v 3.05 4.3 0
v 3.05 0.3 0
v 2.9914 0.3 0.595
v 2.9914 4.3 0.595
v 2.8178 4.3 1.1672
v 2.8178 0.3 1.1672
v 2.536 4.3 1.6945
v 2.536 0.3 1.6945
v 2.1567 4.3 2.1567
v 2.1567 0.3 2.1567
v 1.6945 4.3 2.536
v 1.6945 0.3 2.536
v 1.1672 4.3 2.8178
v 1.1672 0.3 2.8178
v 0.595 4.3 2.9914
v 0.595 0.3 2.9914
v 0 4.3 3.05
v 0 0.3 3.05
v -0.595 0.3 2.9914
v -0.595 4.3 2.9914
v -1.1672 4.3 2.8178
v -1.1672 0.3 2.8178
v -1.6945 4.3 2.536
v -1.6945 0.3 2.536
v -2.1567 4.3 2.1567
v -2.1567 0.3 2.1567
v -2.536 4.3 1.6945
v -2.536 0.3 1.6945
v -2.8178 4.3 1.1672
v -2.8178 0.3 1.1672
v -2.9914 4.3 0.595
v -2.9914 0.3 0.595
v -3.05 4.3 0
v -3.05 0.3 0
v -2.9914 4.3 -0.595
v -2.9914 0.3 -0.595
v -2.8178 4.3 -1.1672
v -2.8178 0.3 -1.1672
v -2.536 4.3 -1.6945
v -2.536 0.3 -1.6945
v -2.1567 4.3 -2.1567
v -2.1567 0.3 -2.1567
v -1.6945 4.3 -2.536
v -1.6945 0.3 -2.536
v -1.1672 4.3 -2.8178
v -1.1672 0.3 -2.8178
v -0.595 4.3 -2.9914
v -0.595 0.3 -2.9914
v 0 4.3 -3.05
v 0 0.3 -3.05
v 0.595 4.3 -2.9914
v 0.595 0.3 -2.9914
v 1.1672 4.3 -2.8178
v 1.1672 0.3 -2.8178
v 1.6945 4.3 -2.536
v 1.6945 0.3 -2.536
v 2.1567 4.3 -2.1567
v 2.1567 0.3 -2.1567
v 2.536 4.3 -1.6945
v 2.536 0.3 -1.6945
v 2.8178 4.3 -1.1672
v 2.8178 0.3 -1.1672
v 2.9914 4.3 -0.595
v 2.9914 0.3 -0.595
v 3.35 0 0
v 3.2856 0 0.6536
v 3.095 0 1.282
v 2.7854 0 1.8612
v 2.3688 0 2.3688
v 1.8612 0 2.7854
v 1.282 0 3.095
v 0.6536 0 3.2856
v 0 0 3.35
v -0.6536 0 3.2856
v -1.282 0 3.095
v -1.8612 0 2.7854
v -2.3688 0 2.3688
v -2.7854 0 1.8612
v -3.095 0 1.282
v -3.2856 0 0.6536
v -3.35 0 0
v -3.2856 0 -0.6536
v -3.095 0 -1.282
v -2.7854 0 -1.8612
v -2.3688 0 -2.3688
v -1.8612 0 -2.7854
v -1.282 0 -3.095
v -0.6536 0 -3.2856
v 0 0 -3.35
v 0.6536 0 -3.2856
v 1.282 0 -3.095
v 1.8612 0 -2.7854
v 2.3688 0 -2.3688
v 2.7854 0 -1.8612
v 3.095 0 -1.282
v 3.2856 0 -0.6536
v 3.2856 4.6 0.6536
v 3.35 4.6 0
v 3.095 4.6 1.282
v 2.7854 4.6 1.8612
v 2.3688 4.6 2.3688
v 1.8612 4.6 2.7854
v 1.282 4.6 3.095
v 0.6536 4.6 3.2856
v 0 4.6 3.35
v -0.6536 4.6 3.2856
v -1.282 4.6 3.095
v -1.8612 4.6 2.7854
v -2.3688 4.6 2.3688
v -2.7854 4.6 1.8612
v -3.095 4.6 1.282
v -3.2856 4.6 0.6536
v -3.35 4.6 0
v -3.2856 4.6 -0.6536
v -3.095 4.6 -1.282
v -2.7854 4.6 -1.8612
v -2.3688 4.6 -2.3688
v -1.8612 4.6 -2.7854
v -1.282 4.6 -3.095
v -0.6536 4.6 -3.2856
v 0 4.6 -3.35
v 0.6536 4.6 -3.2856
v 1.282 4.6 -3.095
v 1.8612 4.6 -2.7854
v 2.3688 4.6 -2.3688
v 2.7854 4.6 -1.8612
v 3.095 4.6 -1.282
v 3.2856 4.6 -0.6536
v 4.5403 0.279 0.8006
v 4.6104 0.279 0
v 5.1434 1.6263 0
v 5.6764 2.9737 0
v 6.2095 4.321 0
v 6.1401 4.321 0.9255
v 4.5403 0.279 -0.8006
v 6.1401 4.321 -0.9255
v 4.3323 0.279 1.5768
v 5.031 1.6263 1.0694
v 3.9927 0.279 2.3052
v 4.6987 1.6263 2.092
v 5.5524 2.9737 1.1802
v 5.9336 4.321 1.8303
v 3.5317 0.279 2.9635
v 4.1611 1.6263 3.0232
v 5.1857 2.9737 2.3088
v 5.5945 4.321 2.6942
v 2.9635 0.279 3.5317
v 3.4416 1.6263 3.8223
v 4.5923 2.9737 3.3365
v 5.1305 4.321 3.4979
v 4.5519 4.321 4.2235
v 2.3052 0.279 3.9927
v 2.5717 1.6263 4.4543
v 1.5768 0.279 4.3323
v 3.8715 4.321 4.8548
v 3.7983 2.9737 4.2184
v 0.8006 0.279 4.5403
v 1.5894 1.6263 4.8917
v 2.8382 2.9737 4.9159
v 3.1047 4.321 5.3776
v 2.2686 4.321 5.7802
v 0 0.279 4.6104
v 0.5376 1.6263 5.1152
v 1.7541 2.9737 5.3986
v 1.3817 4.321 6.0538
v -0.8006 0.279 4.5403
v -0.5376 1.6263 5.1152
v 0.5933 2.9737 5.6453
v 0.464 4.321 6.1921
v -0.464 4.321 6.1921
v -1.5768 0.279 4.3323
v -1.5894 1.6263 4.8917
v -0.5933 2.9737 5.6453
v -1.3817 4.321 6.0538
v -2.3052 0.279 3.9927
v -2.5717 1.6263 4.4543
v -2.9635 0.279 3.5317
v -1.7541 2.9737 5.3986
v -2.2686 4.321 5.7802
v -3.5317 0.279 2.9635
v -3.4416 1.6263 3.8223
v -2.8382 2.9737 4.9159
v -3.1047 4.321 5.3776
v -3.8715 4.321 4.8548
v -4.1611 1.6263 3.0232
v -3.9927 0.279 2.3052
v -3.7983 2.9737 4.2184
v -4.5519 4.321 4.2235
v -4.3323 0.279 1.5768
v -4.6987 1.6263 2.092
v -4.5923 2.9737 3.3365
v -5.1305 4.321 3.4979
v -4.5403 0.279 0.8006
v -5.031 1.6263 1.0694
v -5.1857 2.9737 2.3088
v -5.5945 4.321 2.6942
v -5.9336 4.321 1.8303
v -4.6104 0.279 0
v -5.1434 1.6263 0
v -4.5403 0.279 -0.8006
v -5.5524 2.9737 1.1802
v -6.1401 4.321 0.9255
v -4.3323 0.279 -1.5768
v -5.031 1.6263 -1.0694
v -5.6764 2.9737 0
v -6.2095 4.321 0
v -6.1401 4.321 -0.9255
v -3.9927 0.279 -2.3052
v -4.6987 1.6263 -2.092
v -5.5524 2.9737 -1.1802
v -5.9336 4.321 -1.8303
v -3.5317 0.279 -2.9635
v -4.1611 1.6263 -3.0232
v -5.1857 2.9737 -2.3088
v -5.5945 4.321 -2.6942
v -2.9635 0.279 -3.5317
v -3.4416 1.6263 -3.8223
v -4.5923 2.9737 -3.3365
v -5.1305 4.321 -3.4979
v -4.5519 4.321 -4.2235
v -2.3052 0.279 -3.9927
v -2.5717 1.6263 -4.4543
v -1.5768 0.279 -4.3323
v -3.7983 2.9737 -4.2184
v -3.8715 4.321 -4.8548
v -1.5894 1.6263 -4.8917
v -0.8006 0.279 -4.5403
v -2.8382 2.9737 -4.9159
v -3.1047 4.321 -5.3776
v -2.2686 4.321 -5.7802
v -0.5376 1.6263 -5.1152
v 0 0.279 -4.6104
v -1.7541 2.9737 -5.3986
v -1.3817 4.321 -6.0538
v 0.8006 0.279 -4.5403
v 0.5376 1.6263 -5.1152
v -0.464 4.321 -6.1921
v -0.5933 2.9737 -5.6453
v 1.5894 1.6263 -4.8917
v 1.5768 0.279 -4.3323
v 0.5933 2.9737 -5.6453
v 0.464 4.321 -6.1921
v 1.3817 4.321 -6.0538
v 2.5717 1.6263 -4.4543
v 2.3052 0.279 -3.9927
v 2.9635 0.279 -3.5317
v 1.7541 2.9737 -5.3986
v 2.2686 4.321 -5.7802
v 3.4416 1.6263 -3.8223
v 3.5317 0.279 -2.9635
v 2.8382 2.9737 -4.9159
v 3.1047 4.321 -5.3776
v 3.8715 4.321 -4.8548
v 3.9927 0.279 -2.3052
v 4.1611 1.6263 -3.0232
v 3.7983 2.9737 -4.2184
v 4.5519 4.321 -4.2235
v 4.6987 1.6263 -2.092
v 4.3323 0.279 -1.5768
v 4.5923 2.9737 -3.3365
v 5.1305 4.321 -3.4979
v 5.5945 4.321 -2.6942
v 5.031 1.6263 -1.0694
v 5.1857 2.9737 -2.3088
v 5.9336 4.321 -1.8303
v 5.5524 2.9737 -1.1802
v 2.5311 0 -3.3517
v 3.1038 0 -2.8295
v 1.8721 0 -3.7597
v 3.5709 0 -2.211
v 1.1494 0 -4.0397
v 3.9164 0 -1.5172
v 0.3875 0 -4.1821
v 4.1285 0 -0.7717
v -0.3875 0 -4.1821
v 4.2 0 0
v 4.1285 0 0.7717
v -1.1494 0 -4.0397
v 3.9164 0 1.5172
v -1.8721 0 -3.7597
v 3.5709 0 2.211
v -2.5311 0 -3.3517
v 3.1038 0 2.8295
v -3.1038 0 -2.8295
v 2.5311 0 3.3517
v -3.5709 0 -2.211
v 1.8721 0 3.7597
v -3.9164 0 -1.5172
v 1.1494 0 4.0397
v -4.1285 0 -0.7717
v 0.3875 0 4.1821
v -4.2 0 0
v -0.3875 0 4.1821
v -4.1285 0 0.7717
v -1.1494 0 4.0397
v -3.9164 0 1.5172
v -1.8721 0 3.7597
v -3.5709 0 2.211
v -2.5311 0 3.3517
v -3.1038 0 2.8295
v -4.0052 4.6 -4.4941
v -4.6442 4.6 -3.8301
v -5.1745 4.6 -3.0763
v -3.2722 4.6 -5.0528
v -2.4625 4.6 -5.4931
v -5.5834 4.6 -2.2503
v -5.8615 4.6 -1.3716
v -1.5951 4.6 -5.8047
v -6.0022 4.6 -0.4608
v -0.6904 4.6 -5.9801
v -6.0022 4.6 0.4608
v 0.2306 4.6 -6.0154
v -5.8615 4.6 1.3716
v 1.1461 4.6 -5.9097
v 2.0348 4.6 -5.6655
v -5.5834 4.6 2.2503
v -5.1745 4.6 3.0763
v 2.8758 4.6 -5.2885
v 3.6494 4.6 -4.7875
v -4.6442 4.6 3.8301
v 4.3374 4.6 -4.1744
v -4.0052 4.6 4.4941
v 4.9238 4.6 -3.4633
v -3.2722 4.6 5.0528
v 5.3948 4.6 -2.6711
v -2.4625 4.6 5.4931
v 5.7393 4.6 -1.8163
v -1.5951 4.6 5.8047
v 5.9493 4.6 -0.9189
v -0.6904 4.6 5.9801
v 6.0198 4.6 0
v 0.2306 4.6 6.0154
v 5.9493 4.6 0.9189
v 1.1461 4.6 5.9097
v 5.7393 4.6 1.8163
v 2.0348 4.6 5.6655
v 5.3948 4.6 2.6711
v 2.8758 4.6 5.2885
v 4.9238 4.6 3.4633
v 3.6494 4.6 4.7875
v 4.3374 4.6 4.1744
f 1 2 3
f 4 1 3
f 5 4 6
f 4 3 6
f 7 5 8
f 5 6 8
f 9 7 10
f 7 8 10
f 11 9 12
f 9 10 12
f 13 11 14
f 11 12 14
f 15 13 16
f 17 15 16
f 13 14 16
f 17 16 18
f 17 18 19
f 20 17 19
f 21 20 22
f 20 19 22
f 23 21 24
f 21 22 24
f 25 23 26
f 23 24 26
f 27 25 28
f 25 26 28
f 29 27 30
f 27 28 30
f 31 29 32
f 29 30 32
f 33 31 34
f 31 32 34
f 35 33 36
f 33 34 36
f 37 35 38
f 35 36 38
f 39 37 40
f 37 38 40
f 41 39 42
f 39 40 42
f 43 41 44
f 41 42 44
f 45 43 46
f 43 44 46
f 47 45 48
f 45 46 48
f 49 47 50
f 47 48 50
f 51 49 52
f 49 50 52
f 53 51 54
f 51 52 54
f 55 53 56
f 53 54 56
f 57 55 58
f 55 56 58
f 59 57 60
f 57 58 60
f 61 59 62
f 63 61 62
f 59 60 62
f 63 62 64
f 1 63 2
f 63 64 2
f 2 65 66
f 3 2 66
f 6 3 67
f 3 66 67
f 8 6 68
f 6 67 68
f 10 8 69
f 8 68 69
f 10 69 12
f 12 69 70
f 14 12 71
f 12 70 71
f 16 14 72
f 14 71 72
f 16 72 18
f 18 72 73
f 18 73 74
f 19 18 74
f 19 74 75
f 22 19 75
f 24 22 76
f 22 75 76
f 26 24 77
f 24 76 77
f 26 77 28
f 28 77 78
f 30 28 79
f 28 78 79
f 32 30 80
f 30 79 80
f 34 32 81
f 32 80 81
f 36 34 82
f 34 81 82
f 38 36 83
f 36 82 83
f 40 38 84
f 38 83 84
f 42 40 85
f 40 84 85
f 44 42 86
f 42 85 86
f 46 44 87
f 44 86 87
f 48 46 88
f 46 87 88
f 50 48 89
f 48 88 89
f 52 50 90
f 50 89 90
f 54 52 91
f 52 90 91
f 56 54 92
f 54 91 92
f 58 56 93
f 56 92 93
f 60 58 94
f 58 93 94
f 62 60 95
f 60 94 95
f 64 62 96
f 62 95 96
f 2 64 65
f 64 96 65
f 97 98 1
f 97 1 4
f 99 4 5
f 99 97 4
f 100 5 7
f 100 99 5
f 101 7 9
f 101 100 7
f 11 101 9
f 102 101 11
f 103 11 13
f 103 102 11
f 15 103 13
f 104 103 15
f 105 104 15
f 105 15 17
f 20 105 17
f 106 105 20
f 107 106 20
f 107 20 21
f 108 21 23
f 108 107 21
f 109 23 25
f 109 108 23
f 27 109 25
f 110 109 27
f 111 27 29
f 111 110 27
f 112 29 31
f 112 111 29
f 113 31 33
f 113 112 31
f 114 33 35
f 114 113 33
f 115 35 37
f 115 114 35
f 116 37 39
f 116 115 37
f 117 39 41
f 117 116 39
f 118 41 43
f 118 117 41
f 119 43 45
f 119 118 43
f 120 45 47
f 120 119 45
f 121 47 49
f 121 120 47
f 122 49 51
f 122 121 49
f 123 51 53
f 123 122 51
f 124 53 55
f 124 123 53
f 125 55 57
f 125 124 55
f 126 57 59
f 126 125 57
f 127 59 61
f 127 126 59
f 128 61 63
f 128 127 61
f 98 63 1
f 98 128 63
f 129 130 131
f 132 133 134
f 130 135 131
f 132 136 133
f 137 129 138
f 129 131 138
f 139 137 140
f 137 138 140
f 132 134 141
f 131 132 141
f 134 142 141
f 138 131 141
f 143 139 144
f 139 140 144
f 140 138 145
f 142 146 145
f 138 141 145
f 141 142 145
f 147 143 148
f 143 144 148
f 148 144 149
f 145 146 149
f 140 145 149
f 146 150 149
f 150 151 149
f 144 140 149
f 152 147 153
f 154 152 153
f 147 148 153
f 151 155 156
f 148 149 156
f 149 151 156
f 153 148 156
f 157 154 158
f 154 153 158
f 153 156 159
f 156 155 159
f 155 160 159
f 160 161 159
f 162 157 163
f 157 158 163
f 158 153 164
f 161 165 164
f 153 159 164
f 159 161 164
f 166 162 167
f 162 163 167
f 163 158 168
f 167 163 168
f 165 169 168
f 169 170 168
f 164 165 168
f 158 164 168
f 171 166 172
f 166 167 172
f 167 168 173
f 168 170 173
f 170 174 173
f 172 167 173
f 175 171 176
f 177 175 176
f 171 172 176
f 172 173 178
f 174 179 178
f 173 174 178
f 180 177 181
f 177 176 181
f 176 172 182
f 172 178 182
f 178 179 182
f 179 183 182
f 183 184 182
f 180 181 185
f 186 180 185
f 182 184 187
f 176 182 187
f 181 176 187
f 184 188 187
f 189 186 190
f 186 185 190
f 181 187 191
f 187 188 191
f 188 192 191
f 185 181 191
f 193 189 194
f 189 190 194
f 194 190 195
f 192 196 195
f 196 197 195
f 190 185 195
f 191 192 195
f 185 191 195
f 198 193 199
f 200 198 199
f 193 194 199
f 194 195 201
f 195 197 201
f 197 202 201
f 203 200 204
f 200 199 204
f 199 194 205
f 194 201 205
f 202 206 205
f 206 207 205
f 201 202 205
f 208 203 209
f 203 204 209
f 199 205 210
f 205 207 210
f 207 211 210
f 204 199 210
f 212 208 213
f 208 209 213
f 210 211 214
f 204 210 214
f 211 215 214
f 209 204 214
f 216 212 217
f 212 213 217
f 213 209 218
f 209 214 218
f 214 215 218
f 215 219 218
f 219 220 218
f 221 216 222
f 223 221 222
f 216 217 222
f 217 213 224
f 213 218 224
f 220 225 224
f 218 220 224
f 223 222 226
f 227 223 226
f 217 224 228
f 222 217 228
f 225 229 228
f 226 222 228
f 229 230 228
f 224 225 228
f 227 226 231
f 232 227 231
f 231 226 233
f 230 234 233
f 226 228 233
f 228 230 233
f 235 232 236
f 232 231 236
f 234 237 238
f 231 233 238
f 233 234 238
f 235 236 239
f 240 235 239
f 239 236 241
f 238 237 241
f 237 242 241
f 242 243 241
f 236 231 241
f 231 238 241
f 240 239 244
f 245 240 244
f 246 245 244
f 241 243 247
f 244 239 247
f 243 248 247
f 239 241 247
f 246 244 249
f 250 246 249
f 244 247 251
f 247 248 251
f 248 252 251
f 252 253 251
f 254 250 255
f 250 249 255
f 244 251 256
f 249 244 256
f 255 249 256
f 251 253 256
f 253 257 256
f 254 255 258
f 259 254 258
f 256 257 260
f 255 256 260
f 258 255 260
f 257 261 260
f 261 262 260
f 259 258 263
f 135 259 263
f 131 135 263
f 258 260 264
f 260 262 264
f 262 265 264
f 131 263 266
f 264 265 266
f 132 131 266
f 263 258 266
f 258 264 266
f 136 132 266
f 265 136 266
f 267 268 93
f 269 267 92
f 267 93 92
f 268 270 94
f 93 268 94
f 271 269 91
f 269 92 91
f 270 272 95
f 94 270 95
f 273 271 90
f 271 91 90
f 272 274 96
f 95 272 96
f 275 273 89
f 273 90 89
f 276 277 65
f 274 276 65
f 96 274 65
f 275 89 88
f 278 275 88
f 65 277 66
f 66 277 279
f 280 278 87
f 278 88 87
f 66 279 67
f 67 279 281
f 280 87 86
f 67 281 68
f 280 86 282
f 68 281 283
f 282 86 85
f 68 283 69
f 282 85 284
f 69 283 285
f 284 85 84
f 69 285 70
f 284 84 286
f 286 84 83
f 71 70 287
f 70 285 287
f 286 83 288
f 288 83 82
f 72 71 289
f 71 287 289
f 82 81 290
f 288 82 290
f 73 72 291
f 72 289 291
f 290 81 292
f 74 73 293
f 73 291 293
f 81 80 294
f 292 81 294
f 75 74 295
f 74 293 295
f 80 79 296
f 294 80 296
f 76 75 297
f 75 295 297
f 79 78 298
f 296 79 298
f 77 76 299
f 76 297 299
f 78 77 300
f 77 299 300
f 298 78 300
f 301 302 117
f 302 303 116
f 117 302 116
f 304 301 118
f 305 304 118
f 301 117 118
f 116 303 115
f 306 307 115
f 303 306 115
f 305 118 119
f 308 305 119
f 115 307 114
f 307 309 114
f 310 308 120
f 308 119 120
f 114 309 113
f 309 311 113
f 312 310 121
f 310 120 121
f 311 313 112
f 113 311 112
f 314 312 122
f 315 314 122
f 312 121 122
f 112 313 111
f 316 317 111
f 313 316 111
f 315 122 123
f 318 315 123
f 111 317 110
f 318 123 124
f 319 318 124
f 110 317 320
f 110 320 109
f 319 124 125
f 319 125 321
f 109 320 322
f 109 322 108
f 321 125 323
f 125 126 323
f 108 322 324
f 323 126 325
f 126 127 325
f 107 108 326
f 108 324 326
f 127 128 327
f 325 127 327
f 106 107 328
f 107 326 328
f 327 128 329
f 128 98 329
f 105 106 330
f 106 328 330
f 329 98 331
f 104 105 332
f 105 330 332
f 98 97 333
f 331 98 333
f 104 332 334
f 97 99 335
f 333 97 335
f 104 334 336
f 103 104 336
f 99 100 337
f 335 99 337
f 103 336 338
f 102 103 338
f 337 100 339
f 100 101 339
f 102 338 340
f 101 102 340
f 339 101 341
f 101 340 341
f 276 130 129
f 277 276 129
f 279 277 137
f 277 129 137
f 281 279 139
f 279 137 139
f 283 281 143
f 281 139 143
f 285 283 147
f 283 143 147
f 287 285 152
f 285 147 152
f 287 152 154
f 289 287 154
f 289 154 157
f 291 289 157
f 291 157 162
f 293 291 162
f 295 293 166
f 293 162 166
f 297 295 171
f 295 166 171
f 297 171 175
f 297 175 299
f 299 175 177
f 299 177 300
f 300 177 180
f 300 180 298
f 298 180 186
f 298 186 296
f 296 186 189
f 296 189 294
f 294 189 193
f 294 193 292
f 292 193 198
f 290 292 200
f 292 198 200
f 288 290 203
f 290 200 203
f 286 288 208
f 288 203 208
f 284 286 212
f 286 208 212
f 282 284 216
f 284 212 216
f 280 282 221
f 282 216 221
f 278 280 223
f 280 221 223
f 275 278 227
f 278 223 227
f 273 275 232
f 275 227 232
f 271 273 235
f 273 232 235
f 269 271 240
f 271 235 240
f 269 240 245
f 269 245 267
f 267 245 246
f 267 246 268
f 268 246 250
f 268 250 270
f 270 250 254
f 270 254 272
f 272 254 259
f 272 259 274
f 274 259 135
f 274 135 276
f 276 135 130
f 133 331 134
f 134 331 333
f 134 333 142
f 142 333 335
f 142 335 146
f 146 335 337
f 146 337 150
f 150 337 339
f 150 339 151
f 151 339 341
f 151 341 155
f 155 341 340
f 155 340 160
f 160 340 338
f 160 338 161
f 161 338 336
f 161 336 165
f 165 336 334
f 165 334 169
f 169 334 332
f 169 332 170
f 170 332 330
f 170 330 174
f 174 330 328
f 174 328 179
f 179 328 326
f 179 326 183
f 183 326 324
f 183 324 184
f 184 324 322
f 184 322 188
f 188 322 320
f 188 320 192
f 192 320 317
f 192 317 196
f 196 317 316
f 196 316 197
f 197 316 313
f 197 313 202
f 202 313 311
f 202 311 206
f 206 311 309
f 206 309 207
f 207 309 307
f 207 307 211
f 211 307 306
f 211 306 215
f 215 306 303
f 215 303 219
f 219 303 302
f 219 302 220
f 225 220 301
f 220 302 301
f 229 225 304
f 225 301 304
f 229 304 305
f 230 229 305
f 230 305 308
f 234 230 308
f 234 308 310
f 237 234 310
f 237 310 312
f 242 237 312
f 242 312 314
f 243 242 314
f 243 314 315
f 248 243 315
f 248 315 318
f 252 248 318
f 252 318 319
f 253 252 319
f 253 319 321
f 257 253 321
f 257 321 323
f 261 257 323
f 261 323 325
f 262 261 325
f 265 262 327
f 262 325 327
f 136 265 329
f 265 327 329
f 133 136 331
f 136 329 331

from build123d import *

# Parameters (mm, degrees)
CHAMFER3_SIZE = 0.3


with BuildPart() as part:
    # Sketch3 → Revolve1 (revolve)
    with BuildSketch(Plane.XY):
        Polygon((3.05, 4.6), (3.05, 0), (4.5, 0), (6.31983867, 4.6), align=None)
    revolve(axis=Axis((0, 4.6, 0), (0, -1, 0)))

    # Chamfer3
    chamfer3_edges = [part.edges().sort_by_distance(p)[0] for p in [
        (-6.31983867, 4.6, 0),
        (-4.5, 0, 0),
        (-3.05, 0, 0),
        (-3.05, 4.6, 0),
    ]]
    chamfer(chamfer3_edges, length=CHAMFER3_SIZE)


solid = part.part
